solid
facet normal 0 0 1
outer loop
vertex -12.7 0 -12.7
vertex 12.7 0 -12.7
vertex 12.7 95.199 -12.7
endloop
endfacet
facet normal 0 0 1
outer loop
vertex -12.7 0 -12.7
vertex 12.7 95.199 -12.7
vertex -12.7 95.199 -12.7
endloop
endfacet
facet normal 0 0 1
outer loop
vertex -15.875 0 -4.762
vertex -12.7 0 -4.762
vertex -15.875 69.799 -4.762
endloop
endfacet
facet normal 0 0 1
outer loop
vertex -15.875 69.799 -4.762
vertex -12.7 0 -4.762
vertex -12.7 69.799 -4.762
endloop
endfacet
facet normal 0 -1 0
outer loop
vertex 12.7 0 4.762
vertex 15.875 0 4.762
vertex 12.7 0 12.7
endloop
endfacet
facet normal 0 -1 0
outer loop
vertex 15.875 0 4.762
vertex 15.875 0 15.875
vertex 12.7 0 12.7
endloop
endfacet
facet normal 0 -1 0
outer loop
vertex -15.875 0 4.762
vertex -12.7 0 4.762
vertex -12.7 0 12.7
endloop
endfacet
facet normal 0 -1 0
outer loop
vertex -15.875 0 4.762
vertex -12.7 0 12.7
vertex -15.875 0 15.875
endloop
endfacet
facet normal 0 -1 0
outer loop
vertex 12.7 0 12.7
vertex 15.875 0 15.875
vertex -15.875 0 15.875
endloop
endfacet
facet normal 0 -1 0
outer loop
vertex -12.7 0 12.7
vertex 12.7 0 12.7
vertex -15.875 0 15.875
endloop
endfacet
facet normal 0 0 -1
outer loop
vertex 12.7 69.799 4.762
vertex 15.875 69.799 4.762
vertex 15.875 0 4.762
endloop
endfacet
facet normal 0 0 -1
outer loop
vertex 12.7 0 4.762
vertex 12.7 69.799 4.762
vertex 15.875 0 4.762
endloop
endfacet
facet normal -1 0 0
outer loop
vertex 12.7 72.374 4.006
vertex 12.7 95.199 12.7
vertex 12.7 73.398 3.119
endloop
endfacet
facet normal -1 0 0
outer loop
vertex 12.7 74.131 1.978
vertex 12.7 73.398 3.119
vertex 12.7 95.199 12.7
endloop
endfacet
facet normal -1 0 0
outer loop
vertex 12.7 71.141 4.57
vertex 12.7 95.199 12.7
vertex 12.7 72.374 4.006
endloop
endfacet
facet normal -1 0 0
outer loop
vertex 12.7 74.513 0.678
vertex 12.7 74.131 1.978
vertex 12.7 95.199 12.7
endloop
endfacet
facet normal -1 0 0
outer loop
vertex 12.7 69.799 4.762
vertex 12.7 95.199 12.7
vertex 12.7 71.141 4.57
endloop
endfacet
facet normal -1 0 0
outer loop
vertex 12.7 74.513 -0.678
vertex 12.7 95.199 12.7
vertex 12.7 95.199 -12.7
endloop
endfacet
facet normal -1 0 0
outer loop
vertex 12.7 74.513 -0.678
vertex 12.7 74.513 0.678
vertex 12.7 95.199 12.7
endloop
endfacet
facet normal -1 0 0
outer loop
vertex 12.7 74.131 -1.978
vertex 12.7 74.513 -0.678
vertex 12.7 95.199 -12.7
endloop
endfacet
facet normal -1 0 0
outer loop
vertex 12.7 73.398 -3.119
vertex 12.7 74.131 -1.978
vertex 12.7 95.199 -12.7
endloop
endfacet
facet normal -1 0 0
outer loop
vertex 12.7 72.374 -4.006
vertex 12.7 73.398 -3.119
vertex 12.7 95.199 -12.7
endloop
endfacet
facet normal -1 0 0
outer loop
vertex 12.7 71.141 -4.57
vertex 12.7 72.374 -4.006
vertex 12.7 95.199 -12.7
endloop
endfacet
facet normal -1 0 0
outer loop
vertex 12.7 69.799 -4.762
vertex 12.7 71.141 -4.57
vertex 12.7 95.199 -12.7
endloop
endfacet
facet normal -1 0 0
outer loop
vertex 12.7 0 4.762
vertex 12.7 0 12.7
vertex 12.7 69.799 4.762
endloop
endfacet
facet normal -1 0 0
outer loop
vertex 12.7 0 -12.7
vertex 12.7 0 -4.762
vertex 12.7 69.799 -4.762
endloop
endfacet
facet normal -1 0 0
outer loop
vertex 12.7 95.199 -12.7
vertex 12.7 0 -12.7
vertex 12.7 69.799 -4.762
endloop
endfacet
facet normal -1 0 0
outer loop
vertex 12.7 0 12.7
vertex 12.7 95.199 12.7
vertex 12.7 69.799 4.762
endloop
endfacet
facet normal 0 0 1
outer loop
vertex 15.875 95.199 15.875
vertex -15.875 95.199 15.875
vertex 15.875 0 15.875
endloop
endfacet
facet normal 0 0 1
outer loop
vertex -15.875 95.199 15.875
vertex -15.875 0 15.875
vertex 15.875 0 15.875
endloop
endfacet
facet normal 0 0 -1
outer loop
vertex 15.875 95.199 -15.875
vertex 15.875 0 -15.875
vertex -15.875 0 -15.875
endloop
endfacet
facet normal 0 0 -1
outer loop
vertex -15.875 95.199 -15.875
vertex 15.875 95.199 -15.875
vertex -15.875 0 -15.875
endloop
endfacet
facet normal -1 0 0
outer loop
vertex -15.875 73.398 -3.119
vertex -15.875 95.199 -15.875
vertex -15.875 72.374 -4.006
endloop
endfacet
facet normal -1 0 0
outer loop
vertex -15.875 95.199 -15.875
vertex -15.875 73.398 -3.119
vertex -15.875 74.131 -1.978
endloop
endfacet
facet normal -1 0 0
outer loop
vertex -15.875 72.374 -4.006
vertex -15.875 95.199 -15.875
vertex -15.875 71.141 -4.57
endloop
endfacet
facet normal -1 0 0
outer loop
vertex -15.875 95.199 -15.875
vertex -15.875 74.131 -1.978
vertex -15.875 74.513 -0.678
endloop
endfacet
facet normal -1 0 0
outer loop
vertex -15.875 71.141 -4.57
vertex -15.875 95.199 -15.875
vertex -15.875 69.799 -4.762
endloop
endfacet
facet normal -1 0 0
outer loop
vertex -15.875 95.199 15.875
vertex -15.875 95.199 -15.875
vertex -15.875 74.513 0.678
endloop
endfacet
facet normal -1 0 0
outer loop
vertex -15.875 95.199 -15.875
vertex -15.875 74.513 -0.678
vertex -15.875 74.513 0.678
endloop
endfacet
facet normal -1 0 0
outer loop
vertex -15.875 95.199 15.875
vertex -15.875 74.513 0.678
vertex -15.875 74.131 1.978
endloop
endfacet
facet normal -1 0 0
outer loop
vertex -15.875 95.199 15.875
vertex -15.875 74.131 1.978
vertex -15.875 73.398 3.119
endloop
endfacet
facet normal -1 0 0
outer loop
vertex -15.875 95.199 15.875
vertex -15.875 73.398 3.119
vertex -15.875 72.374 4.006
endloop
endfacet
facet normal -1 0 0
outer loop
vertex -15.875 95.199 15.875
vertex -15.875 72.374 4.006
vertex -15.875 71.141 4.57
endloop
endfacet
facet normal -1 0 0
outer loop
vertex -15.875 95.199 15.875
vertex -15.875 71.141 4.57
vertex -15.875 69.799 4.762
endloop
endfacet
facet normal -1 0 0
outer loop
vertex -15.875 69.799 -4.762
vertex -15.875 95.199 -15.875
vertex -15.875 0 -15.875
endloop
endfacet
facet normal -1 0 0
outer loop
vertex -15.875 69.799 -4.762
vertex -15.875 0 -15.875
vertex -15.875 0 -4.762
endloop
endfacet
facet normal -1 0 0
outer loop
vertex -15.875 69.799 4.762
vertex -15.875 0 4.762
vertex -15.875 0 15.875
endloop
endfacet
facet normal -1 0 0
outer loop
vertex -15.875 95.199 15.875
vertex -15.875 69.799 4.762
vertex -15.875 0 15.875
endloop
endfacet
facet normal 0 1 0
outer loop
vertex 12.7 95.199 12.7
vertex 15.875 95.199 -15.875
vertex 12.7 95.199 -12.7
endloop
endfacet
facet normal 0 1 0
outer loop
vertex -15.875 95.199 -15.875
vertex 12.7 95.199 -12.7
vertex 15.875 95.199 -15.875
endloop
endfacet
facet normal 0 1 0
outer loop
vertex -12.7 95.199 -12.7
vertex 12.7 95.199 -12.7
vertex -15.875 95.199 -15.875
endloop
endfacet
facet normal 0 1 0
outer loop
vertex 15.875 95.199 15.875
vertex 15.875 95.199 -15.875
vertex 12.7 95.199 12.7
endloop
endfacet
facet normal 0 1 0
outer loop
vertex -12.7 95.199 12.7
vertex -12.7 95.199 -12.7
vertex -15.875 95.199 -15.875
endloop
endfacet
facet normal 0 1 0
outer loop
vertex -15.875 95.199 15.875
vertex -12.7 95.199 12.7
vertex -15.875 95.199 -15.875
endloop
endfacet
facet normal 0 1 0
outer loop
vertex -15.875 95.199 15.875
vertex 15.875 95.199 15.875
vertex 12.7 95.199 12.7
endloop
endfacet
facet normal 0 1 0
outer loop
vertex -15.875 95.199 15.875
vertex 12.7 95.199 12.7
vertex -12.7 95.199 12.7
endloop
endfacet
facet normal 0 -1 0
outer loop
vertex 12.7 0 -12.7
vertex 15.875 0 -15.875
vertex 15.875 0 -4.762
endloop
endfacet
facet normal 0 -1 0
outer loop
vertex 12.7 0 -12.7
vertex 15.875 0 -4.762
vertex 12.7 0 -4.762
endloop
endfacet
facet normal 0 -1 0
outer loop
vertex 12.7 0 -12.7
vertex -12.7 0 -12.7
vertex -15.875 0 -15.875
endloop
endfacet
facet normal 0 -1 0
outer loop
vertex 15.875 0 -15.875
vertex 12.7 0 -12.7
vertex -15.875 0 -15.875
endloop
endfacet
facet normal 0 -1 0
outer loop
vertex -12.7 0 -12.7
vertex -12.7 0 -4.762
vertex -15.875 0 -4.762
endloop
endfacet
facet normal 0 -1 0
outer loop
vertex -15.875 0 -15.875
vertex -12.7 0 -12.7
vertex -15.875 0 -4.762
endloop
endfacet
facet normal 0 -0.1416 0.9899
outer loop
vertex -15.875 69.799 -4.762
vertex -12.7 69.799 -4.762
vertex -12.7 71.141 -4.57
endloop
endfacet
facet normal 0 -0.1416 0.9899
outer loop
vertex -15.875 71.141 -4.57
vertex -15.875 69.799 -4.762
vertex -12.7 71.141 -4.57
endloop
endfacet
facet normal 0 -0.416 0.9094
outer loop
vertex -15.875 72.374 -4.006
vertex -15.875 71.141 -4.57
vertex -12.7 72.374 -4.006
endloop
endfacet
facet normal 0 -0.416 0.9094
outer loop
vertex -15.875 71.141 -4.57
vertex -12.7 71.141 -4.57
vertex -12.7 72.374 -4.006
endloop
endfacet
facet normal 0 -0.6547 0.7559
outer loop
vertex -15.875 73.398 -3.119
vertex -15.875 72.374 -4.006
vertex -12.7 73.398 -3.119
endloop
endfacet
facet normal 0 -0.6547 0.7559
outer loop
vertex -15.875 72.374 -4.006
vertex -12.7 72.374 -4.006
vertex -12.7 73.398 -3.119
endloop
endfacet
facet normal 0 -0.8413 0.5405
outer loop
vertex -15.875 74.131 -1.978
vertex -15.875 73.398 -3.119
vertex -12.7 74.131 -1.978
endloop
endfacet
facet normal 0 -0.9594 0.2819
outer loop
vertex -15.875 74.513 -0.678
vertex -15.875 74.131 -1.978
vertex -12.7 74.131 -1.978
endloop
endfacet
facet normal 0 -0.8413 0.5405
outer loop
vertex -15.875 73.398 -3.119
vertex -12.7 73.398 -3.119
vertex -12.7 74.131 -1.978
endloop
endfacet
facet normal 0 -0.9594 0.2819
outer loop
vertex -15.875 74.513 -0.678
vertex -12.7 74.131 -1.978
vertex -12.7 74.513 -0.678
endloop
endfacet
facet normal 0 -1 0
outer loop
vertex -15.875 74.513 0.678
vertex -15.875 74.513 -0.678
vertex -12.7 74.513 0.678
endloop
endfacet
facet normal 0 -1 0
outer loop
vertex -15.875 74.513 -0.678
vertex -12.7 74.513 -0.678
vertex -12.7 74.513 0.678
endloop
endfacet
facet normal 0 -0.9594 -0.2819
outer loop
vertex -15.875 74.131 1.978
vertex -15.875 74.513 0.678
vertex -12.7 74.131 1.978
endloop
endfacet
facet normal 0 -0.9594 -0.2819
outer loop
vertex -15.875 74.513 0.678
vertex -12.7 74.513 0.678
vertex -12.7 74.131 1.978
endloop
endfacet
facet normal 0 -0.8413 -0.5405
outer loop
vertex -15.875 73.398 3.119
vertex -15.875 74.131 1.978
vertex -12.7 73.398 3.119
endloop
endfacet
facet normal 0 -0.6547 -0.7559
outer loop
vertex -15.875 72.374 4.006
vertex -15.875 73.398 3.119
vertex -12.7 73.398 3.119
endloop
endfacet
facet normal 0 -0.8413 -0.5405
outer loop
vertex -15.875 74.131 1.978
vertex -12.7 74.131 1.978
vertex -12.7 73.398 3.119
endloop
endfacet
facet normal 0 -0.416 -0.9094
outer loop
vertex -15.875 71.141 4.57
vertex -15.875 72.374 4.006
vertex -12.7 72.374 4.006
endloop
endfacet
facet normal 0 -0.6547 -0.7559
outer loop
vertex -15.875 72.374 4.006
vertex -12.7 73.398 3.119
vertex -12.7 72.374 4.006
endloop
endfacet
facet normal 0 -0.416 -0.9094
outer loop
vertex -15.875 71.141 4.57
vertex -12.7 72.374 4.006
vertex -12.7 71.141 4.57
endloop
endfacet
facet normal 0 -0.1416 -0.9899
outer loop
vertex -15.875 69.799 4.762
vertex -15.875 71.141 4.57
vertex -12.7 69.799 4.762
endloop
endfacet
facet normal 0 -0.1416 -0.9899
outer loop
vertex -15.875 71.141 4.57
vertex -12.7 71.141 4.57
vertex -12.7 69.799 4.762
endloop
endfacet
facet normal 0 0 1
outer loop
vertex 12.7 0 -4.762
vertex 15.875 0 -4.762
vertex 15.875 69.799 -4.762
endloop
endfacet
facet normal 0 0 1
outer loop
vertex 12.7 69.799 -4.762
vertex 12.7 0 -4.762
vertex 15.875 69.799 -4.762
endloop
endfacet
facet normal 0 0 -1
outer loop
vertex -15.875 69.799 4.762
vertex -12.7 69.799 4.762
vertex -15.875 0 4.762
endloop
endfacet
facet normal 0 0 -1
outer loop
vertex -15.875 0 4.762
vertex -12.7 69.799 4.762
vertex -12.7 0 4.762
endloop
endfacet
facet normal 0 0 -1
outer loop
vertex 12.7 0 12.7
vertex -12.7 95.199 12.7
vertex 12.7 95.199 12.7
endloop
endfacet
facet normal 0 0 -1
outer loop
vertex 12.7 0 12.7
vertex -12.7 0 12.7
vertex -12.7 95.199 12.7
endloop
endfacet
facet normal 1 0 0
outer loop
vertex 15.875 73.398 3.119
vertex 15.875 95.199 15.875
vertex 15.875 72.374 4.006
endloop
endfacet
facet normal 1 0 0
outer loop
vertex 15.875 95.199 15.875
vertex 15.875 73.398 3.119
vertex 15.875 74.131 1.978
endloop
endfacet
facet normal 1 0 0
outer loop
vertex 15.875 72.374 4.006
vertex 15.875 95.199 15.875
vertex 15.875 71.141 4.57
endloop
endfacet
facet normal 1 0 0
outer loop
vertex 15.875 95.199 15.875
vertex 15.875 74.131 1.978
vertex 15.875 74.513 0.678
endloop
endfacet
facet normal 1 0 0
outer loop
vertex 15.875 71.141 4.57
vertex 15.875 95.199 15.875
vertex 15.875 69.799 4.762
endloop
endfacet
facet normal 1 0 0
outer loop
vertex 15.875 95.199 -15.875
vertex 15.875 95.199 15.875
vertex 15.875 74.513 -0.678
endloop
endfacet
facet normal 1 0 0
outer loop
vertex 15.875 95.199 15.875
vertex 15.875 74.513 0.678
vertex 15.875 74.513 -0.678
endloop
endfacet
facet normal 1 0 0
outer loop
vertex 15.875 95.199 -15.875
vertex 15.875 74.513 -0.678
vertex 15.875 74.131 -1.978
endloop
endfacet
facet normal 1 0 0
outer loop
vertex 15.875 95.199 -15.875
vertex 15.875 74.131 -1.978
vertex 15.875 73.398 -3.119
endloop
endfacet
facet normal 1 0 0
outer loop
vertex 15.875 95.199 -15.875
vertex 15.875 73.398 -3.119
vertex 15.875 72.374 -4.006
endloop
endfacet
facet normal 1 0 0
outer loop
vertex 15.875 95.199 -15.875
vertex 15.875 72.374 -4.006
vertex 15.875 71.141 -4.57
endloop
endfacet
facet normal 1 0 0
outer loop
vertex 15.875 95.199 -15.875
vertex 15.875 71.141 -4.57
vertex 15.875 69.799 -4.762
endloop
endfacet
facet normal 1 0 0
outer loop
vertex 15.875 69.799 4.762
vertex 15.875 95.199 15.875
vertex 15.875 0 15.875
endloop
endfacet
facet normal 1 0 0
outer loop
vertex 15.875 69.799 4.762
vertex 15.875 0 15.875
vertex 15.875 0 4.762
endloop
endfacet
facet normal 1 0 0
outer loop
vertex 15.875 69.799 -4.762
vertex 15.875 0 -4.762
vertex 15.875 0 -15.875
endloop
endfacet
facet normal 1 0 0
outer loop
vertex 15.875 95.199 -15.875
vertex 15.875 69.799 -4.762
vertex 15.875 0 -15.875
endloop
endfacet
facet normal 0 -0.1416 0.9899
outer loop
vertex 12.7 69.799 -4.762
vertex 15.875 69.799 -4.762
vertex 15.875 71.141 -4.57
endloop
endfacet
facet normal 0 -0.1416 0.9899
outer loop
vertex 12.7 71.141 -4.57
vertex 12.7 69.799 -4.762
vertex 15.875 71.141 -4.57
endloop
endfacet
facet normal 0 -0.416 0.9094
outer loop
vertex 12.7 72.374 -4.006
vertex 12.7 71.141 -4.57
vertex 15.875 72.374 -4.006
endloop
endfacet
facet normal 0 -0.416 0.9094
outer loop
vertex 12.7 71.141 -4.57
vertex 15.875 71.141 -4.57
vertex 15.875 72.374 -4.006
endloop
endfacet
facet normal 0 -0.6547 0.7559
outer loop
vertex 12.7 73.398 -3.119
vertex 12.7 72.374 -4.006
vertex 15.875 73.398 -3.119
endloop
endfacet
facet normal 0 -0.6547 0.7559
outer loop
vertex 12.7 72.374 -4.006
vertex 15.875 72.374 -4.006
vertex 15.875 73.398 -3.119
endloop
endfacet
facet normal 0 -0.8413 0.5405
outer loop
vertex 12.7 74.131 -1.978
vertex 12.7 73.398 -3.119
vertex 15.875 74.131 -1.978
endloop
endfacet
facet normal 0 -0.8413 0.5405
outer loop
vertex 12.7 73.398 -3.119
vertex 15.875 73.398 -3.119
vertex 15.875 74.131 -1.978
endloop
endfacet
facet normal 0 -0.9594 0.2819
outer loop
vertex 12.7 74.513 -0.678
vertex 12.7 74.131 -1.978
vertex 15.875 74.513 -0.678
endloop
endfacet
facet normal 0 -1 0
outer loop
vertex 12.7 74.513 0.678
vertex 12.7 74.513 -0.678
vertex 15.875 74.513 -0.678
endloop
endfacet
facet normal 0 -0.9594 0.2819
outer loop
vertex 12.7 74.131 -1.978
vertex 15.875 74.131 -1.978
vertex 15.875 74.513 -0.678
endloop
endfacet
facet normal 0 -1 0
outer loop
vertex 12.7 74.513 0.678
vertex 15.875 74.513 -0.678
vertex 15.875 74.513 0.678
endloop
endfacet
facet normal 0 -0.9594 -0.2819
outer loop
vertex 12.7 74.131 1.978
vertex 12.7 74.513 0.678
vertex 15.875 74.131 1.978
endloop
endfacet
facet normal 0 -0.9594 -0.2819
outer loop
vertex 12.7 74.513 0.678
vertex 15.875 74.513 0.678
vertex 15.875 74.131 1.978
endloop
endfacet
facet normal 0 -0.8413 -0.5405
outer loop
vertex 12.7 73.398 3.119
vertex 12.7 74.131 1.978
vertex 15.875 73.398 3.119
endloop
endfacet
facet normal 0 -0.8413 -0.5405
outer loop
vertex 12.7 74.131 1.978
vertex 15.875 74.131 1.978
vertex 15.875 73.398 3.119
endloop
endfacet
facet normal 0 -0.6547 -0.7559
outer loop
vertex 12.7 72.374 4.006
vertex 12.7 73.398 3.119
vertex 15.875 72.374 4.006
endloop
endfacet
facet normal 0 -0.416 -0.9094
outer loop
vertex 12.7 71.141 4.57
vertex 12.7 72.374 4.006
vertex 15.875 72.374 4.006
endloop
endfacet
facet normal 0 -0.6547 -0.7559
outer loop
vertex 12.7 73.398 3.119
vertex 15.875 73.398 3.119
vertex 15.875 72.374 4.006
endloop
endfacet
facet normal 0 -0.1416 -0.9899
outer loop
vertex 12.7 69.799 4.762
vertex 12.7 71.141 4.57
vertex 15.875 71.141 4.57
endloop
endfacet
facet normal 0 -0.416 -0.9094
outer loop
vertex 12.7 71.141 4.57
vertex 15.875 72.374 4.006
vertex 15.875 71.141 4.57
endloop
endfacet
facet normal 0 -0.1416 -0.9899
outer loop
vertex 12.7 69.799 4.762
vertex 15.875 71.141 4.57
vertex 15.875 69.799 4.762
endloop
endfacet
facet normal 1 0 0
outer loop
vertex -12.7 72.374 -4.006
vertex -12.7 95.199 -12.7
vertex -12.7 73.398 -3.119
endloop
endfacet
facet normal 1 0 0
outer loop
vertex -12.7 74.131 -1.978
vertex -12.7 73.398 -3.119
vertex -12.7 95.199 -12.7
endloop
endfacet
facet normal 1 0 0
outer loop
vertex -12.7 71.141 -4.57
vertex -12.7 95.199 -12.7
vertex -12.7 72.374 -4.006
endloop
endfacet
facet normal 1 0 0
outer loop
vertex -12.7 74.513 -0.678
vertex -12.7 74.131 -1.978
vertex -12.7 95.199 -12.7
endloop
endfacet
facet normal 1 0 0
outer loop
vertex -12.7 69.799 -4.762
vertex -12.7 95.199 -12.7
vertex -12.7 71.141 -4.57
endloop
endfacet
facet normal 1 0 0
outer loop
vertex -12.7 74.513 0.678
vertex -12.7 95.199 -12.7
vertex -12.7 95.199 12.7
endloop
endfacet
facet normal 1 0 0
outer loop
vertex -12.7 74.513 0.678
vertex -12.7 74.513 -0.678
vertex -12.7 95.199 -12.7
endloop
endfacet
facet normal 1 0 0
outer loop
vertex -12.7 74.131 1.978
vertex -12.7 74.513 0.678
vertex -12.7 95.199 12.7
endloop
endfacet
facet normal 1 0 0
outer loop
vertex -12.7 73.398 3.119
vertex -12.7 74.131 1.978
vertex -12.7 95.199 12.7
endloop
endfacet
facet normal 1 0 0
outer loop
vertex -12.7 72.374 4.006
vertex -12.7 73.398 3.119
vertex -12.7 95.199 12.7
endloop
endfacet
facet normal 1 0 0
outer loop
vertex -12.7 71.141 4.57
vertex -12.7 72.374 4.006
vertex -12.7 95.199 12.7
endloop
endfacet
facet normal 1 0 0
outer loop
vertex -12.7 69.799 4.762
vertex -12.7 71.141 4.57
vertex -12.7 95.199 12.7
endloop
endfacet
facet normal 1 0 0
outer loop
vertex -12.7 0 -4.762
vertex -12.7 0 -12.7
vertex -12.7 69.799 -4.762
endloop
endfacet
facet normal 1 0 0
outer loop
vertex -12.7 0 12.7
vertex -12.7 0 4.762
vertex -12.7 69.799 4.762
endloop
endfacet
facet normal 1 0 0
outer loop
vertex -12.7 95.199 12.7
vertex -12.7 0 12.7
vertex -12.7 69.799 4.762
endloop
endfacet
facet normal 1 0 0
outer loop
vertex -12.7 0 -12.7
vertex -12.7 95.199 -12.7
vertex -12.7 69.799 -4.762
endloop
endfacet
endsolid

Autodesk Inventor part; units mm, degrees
ref_plane "YZ Plane" through (0, 0, 0) normal (1, 0, 0) x (0, 1, 0)
ref_plane "XZ Plane" through (0, 0, 0) normal (0, 1, 0) x (-1, 0, 0)
ref_plane "XY Plane" through (0, 0, 0) normal (0, 0, 1) x (1, 0, 0)
sketch "Sketch1" plane through (0, 0, 0) normal (0, 1, 0) x (-1, 0, 0)
  line L0 (12.7, 12.7) -> (-12.7, 12.7)
  line L1 (-12.7, 12.7) -> (-12.7, -12.7)
  line L2 (-12.7, -12.7) -> (12.7, -12.7)
  line L3 (12.7, -12.7) -> (12.7, 12.7)
  line L4 (12.7, 12.7) -> (-12.7, -12.7) construction
  line L5 (-12.7, 12.7) -> (12.7, -12.7) construction
  line L6 (15.875, 15.875) -> (-15.875, 15.875)
  line L7 (-15.875, 15.875) -> (-15.875, -15.875)
  line L8 (-15.875, -15.875) -> (15.875, -15.875)
  line L9 (15.875, -15.875) -> (15.875, 15.875)
  line L10 (15.875, 15.875) -> (-15.875, -15.875) construction
  line L11 (-15.875, 15.875) -> (15.875, -15.875) construction
  point P0 (0, 0)
  dimension "d0" = 25.4
  dimension "d1" = 25.4
  dimension "d2" = 3.175
  dimension "d3" = 3.175
extrude "Extrusion1" add sketch "Sketch1" along normal blind 95.1992
sketch "Sketch2" plane through (15.875, 0, 15.875) normal (1, 0, 0) x (0, 0, -1)
  line L0 (15.875, 0) -> (15.875, 69.7992) construction
  line L1 (20.6375, 0) -> (20.6375, 69.7992)
  line L2 (11.1125, 69.7992) -> (11.1125, 0)
  arc A0 (11.1125, 0) -> (20.6375, 0) centre (15.875, 0) ccw
  arc A1 (20.6375, 69.7992) -> (11.1125, 69.7992) centre (15.875, 69.7992) ccw
  line L3 (0, 0) -> (31.75, 0) projected
  point P0 (15.875, 34.8996)
  dimension "d6" = 4.7625
  dimension "d7" = 69.7992
extrude "Extrusion2" cut sketch "Sketch2" against normal through all
sketch "Sketch3" plane through (-15.875, 0, 15.875) normal (0, 0, 1) x (1, 0, 0)
  line L0 (15.875, 0) -> (15.875, 95.1992) construction
  line L1 (28.575, 95.1992) -> (3.175, 95.1992) construction
  line L2 (0, 0) -> (31.75, 0) construction
  point P0 (15.875, 50.8)
  dimension "d10" = 50.8
properties part number "capForPost"
